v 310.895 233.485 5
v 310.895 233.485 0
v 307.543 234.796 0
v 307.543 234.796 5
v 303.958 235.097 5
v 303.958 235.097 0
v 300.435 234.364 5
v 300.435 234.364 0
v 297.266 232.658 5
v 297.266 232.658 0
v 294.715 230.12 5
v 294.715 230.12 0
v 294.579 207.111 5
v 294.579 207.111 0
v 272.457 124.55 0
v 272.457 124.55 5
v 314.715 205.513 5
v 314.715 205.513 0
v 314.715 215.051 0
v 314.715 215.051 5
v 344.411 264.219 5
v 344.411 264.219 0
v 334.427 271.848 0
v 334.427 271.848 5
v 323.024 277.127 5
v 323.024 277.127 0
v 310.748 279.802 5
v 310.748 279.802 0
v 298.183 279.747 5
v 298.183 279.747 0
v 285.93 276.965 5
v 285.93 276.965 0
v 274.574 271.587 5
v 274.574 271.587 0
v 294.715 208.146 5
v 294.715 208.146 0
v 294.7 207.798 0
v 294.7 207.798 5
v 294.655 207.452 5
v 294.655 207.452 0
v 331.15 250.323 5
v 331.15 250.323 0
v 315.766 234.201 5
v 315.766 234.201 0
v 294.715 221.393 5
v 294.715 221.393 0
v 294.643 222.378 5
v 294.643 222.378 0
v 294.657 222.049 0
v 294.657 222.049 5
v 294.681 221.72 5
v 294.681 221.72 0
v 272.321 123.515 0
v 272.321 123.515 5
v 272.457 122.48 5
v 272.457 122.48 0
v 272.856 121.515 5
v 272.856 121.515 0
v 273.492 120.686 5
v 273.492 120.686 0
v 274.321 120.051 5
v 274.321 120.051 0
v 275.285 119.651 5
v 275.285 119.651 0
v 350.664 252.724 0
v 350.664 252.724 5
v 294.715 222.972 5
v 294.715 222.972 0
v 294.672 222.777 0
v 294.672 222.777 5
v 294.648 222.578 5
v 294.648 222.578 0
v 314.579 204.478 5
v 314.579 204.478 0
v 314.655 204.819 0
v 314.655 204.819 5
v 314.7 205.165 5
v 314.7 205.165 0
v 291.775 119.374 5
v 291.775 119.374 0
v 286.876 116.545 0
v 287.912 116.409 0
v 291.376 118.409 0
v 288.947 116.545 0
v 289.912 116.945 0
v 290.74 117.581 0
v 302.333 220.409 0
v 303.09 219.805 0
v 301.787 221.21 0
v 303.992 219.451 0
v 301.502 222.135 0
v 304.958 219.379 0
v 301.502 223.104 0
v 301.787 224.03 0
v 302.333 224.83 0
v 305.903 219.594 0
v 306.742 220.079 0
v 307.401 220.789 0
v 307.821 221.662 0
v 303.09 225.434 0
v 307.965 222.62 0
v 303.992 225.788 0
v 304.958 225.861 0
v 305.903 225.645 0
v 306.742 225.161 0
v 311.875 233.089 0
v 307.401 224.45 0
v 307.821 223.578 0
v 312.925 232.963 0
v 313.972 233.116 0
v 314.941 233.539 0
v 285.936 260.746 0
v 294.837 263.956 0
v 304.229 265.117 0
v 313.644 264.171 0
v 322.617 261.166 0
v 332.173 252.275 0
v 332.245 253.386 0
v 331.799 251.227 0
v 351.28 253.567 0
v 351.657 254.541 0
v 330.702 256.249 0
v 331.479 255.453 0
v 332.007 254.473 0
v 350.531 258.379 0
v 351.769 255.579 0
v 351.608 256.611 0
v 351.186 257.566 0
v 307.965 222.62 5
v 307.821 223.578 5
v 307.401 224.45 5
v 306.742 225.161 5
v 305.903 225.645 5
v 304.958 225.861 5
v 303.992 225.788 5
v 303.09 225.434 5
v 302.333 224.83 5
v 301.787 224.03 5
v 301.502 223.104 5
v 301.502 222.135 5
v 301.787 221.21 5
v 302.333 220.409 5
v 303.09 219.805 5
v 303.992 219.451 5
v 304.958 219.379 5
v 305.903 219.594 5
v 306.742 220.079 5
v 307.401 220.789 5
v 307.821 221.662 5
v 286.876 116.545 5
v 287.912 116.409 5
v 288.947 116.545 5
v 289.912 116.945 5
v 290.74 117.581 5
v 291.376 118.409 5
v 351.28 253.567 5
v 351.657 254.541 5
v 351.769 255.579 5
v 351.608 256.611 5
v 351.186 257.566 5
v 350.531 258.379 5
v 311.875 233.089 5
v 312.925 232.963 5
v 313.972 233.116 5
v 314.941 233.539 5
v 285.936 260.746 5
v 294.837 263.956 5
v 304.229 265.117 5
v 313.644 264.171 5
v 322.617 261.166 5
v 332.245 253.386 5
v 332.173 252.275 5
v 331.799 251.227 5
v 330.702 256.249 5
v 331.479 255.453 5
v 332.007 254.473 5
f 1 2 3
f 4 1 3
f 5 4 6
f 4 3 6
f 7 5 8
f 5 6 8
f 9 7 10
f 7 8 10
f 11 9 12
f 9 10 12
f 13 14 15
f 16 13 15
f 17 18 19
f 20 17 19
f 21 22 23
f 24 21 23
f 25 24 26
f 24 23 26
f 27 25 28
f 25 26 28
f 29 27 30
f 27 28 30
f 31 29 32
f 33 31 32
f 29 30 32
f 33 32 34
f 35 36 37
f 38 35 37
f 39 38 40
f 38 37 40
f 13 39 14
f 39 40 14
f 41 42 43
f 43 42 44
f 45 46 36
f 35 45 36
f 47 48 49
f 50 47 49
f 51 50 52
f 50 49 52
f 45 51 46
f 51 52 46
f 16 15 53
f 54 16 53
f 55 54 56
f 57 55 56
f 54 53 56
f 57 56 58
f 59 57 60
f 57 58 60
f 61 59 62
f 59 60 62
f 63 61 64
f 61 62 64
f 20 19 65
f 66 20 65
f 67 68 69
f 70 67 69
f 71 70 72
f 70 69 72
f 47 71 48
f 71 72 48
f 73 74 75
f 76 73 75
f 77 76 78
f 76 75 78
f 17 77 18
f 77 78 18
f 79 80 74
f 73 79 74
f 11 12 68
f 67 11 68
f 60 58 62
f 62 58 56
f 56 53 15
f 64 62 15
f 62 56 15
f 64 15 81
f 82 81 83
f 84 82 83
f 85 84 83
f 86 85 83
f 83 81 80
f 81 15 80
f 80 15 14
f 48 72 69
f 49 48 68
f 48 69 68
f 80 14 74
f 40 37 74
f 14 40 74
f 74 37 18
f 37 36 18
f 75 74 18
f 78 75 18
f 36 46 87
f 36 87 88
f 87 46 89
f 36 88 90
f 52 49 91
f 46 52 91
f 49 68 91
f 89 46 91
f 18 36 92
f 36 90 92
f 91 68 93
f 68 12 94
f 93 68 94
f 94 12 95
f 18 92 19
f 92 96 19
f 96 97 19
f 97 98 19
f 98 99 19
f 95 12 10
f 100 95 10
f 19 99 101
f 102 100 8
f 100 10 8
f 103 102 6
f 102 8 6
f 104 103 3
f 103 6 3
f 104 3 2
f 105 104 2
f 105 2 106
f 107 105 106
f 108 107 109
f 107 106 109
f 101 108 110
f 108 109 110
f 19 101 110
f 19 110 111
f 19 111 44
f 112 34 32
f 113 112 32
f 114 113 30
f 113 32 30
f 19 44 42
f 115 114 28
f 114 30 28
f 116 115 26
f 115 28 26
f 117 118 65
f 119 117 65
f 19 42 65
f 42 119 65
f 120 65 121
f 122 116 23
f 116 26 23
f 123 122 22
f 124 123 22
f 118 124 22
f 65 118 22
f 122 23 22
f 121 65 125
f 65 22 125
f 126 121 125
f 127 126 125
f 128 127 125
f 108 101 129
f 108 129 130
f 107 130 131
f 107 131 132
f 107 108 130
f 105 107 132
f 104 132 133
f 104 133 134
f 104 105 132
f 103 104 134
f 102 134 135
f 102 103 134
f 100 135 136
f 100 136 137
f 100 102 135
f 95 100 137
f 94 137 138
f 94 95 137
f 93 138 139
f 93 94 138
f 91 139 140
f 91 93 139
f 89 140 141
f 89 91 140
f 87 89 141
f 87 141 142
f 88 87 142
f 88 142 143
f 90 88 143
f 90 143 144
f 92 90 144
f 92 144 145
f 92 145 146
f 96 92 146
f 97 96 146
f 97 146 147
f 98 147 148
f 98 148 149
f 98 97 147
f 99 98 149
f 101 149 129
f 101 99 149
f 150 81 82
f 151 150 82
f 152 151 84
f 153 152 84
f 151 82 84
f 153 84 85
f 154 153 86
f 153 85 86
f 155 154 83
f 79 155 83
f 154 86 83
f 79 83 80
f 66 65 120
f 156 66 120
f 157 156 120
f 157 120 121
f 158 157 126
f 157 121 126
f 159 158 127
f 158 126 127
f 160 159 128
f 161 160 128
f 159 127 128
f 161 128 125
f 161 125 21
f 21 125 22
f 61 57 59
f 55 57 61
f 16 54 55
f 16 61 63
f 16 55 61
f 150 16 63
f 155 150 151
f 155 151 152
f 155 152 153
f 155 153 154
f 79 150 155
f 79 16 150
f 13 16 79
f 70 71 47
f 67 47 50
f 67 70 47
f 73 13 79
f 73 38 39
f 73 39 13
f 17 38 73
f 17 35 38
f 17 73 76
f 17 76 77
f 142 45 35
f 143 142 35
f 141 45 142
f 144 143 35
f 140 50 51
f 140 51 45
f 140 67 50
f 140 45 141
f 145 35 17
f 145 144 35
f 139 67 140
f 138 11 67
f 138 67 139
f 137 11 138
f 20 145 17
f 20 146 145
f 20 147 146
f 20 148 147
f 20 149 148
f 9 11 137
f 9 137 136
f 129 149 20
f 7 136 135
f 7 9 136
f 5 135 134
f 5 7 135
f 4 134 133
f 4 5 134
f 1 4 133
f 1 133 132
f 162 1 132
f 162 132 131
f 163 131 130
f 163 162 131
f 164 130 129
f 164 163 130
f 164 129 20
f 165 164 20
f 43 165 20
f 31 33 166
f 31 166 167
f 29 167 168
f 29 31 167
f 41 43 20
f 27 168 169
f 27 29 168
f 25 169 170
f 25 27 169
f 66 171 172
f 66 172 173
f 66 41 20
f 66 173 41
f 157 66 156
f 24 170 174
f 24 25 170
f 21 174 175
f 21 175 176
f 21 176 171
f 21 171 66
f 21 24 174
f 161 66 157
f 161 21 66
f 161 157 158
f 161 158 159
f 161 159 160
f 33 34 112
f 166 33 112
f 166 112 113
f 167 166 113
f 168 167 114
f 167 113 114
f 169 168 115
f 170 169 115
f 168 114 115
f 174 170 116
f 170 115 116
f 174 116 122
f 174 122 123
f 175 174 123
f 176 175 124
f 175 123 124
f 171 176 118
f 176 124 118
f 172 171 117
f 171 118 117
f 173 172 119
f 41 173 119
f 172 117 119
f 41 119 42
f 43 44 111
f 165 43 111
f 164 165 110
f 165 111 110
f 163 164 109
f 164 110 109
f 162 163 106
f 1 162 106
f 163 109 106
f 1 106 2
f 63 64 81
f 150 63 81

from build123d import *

# Parameters (mm, degrees)
MODEL_R             = 3.25
BOSS_EXTRUDE1_DEPTH = 5


with BuildPart() as part:
    # Model → Boss-Extrude1 (new body)
    with BuildSketch(Plane.XY):
        with BuildLine():
            Line((350.531086943, 258.379089544), (344.410544625, 264.21942133))
            ThreePointArc((344.410544625, 264.21942133), (310.747790065, 279.802358255), (274.574415573, 271.586766634))
            Line((274.574415573, 271.586766634), (285.935808975, 260.74552029))
            ThreePointArc((285.935808975, 260.74552029), (308.96264008, 264.906909994), (330.701924732, 256.249218742))
            ThreePointArc((330.701924732, 256.249218742), (332.244741838, 253.385658556), (331.150021748, 250.322678066))
            Line((331.150021748, 250.322678066), (315.766337555, 234.200907326))
            ThreePointArc((315.766337555, 234.200907326), (313.453795395, 233.004786403), (310.89495725, 233.485310955))
            ThreePointArc((310.89495725, 233.485310955), (302.169602206, 234.857703267), (294.715316918, 230.11967497))
            Line((294.715316918, 230.11967497), (294.715316918, 222.972135785))
            ThreePointArc((294.715316918, 222.972135785), (294.657727687, 222.677637577), (294.643218038, 222.377912396))
            ThreePointArc((294.643218038, 222.377912396), (294.667183717, 221.884389879), (294.715316918, 221.392635851))
            Line((294.715316918, 221.392635851), (294.715316918, 208.14628496))
            ThreePointArc((294.715316918, 208.14628496), (294.681096364, 207.624180191), (294.579020223, 207.11100878))
            Line((294.579020223, 207.11100878), (272.456879039, 124.550053909))
            ThreePointArc((272.456879039, 124.550053909), (272.856480729, 121.514777728), (275.285306164, 119.651074423))
            Line((275.285306164, 119.651074423), (286.876416079, 116.545245882))
            ThreePointArc((286.876416079, 116.545245882), (289.91169226, 116.944847572), (291.775395565, 119.373673007))
            Line((291.775395565, 119.373673007), (314.579020223, 204.477958828))
            ThreePointArc((314.579020223, 204.477958828), (314.681096364, 204.991130239), (314.715316918, 205.513235008))
            Line((314.715316918, 205.513235008), (314.715316918, 215.05078415))
            Line((314.715316918, 215.05078415), (350.663575197, 252.723787))
            ThreePointArc((350.663575197, 252.723787), (351.768582577, 255.578877488), (350.531086943, 258.379089544))
        make_face()
        with Locations((304.715316918, 222.61967497)):
            Circle(MODEL_R, mode=Mode.SUBTRACT)
    extrude(amount=BOSS_EXTRUDE1_DEPTH)


solid = part.part
